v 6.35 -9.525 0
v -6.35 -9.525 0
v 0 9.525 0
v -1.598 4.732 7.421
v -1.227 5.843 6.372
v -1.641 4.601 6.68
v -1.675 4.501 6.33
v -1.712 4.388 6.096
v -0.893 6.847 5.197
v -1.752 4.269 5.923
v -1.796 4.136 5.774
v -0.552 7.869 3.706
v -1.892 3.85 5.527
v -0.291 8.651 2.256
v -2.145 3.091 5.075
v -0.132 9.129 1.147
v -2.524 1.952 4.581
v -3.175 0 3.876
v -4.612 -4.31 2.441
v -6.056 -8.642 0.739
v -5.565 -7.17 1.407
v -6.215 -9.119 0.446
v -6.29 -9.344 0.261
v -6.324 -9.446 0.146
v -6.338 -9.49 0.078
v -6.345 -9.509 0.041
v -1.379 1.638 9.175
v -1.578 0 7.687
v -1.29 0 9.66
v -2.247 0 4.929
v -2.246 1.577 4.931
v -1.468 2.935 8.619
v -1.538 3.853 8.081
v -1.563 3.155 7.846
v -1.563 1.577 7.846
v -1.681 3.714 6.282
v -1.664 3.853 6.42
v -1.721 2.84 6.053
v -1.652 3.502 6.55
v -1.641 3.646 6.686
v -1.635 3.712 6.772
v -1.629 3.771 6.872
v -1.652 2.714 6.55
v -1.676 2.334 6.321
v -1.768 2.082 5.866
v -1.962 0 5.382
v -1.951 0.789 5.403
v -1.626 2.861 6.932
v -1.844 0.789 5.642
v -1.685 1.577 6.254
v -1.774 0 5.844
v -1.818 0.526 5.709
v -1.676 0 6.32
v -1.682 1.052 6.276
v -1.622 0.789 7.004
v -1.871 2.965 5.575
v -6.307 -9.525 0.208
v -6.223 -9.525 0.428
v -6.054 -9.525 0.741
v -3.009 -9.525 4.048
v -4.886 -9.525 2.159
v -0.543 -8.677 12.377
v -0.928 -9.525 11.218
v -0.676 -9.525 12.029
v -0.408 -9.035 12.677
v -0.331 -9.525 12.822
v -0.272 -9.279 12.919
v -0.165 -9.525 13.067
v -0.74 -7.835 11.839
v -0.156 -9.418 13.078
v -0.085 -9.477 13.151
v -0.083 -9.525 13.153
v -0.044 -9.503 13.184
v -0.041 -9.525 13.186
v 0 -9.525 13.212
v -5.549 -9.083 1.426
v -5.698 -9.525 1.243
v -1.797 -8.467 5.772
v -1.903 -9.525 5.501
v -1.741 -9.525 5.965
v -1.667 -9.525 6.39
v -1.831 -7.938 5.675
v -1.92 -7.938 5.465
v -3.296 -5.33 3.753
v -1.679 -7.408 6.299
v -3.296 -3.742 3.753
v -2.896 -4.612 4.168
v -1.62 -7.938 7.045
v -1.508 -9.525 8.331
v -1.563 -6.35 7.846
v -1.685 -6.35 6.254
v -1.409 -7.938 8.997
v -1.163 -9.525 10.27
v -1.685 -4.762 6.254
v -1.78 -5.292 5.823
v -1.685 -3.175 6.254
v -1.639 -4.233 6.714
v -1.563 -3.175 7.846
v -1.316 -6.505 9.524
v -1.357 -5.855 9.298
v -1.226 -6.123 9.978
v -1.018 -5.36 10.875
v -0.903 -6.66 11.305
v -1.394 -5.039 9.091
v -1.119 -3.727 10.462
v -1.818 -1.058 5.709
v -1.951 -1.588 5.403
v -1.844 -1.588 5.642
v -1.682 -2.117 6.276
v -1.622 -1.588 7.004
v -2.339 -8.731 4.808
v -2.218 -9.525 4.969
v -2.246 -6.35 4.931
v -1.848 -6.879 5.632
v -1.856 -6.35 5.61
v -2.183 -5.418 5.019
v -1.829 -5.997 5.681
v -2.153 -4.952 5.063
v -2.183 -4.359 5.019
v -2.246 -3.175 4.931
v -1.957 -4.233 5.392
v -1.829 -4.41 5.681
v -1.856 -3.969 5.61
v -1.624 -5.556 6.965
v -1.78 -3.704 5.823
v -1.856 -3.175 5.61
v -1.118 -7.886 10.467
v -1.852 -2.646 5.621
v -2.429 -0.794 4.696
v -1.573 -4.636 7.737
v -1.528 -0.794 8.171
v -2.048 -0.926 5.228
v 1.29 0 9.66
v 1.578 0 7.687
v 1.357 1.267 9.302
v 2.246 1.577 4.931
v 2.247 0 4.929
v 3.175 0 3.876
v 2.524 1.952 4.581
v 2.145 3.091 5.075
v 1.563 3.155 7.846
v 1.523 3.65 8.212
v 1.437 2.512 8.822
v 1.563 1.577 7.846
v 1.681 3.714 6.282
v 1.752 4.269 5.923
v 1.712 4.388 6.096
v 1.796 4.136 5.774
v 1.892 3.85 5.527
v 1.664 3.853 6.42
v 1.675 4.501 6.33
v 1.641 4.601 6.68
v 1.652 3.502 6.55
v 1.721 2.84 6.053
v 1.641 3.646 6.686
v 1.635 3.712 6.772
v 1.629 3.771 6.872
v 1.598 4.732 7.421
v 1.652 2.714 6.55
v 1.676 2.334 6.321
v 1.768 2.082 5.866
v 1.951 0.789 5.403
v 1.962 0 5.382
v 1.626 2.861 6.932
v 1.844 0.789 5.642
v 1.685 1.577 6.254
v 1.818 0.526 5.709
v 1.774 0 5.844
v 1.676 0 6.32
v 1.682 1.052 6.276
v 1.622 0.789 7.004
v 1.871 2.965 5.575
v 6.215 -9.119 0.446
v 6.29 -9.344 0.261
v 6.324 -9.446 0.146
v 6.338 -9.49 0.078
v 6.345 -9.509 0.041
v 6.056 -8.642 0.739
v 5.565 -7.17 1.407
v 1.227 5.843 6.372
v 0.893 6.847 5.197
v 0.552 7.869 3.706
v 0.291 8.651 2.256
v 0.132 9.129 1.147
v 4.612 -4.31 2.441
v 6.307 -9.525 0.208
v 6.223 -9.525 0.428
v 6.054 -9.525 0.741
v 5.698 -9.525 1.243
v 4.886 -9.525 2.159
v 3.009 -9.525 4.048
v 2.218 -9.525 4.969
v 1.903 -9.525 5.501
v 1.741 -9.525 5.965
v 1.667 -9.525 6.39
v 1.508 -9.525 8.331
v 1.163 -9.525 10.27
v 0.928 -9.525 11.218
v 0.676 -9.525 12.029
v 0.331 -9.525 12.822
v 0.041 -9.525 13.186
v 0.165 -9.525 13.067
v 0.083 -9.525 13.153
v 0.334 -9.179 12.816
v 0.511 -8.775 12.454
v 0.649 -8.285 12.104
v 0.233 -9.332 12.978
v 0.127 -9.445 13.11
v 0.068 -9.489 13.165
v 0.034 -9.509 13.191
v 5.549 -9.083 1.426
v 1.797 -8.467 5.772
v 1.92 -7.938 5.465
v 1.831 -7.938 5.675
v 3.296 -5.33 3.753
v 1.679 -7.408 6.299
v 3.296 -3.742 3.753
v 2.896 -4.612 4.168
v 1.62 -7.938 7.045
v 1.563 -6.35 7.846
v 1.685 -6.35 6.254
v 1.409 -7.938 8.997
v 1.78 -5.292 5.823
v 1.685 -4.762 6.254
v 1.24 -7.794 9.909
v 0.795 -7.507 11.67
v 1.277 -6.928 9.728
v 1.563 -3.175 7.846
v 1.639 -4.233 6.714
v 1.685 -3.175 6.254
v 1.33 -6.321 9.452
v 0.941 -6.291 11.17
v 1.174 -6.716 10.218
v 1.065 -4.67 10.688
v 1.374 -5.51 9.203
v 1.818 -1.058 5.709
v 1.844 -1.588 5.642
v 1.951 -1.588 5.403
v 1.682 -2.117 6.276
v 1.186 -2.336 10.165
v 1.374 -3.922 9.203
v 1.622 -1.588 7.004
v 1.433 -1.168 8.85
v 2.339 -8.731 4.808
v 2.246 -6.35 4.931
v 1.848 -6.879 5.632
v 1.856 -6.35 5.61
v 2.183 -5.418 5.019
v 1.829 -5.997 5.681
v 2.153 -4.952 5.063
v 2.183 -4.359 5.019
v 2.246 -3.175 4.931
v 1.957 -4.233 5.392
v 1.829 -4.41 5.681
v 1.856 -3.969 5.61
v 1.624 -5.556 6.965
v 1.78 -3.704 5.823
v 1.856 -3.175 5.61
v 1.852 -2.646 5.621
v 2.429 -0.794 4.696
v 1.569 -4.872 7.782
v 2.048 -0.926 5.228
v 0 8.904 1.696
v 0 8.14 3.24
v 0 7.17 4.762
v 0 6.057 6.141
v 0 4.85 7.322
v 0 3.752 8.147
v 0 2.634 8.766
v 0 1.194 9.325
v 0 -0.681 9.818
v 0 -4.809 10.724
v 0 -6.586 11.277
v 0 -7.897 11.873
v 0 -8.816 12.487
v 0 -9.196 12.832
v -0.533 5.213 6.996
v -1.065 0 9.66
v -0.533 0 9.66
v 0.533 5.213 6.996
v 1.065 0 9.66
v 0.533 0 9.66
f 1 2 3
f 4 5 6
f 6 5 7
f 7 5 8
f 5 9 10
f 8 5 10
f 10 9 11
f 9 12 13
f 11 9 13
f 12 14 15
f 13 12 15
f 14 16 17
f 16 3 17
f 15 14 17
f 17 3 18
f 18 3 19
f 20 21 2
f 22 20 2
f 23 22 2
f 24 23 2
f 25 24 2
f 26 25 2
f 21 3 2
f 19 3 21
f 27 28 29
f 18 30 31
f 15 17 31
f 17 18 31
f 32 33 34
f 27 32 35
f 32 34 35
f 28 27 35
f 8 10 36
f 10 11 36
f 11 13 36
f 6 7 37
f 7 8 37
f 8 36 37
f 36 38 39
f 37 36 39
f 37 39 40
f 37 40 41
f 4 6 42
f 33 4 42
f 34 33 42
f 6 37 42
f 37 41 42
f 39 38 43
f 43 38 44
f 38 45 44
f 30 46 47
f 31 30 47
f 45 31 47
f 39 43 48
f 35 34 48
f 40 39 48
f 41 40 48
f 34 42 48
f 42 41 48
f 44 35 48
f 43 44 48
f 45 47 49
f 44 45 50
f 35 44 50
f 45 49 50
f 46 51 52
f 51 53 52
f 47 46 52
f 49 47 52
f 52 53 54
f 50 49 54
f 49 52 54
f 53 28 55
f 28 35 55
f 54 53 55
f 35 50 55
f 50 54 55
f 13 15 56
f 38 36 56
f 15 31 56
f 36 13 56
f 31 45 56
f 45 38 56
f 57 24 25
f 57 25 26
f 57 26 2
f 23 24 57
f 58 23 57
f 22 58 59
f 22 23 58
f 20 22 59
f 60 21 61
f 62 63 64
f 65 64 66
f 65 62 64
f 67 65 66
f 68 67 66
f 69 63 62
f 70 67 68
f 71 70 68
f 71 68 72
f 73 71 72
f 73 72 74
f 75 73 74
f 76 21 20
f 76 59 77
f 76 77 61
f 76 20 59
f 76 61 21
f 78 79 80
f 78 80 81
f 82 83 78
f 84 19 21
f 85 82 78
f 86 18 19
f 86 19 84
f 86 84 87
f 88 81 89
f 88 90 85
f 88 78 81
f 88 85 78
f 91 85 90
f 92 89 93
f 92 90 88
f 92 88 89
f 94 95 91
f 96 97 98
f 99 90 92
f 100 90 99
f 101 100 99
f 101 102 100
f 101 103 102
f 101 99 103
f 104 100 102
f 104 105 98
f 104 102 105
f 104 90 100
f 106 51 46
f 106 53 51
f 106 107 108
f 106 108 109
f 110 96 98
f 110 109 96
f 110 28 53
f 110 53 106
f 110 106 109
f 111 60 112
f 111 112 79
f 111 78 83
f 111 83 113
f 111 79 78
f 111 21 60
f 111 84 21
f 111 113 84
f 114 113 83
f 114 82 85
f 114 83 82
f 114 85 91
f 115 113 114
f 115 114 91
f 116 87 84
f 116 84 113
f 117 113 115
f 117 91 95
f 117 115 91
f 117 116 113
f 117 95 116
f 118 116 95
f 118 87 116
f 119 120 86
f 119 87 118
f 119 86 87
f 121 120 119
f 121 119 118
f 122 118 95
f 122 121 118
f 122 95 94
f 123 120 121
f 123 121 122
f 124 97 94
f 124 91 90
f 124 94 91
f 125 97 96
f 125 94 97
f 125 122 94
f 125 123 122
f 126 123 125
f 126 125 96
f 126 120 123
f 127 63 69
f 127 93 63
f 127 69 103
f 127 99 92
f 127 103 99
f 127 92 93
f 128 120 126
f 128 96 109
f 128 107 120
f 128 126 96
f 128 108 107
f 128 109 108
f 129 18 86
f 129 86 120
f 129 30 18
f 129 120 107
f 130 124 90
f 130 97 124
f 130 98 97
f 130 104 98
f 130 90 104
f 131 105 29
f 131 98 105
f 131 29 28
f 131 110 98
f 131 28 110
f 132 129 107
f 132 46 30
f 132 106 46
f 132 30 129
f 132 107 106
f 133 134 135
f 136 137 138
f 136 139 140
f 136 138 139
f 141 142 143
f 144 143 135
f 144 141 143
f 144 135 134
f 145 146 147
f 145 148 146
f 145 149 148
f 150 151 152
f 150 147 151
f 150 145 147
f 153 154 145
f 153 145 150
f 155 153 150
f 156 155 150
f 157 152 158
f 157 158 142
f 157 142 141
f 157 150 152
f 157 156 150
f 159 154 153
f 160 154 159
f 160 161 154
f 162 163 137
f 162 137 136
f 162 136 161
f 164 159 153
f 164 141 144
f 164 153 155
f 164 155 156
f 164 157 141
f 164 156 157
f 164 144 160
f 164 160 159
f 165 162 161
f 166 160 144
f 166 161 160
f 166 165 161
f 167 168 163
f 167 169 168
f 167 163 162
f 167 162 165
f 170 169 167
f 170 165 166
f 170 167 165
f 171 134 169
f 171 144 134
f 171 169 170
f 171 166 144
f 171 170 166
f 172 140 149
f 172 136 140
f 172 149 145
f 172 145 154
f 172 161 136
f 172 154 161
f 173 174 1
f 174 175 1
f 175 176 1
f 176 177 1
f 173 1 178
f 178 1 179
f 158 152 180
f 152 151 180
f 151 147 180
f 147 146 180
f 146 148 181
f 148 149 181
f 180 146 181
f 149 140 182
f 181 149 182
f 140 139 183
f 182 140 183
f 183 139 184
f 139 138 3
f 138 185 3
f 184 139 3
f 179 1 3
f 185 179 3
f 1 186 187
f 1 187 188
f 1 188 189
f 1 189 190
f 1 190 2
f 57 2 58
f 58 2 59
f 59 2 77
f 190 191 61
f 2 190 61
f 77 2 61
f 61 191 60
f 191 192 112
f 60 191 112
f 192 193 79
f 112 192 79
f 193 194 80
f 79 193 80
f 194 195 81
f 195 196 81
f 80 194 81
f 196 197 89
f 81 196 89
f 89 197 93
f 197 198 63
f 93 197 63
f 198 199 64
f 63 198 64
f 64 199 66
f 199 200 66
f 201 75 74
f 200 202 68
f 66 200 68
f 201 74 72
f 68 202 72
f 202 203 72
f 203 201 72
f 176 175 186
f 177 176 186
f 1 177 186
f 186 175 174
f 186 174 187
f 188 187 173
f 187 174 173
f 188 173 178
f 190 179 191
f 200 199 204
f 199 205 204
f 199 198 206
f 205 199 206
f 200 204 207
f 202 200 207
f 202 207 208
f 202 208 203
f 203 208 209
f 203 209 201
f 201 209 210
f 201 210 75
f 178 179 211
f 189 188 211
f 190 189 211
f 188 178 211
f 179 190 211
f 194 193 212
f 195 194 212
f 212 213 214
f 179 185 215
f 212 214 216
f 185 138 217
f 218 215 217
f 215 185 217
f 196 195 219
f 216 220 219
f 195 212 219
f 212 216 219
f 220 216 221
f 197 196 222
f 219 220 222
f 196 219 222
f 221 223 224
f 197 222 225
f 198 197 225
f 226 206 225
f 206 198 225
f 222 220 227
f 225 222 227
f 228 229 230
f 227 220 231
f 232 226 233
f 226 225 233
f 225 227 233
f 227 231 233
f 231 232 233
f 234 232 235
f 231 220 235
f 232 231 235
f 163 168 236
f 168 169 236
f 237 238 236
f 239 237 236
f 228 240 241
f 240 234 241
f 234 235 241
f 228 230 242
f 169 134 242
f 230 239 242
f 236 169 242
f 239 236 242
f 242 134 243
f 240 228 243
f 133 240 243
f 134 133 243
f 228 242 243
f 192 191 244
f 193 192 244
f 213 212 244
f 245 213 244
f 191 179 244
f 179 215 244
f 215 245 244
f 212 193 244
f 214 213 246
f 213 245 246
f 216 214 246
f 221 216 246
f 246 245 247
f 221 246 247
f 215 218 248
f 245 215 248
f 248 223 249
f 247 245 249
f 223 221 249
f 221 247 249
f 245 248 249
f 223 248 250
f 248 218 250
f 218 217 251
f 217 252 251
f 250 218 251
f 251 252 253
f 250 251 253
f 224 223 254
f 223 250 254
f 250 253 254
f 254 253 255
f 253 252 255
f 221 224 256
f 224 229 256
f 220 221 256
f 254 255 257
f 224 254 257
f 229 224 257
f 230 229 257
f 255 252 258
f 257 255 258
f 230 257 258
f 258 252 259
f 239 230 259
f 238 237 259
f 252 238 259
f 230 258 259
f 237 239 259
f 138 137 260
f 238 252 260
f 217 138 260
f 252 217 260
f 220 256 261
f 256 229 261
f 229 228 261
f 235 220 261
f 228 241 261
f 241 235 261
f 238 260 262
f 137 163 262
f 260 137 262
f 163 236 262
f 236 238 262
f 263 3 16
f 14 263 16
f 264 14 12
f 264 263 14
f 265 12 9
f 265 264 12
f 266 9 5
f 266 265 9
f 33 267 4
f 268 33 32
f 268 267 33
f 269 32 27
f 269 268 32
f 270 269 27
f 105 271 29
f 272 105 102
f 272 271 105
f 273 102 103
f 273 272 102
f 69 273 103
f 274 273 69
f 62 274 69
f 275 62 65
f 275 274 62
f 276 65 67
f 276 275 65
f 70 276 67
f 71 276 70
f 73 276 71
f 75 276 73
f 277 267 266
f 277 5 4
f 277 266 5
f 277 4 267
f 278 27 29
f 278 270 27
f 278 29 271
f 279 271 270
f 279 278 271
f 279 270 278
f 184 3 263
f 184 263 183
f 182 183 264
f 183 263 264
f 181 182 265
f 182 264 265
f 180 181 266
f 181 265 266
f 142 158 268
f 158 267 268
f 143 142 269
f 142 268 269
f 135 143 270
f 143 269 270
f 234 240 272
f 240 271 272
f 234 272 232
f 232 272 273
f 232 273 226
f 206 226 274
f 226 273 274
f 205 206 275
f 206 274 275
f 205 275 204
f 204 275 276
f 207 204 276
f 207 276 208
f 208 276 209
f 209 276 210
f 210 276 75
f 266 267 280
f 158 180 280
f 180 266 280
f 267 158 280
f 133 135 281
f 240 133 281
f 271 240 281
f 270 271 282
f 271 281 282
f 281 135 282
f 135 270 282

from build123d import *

# Parameters (mm, degrees)
F2_DEPTH      = 9.525
F2_DEPTH_BACK = 9.525
F4_DEPTH      = 25.4
F4_DEPTH_BACK = 25.4
F6_DEPTH      = 25.4


with BuildPart() as f2:
    # F1 (on Front) → F2 (new body, two sides)
    with BuildSketch(Plane.XZ) as f2_sk:
        with BuildLine():
            add(Edge.make_bspline(
                [(-6.35, 0), (-6.2110349142, 1.2906979649), (-1.2972179352, 5.0159845421), (-1.9115572012, 7.3429921483), (-0.6704563662, 12.8414753028), (0, 13.2119530768)],
                knots=[0, 0, 0, 0, 0.3821787562, 0.6432599793, 1, 1, 1, 1], degree=3))
            Line((-6.35, 0), (6.35, 0))
            add(Edge.make_bspline(
                [(6.35, 0), (6.2110349142, 1.2906979649), (1.2972179352, 5.0159845421), (1.9115572012, 7.3429921483), (0.6704563662, 12.8414753028), (0, 13.2119530768)],
                knots=[0, 0, 0, 0, 0.3821787562, 0.6432599793, 1, 1, 1, 1], degree=3))
        make_face()
    extrude(amount=F2_DEPTH)
    extrude(f2_sk.sketch, amount=-F2_DEPTH_BACK)

    # F3 (on Right) → F4 (cut, two sides)
    with BuildSketch(Plane.YZ) as f4_sk:
        with BuildLine():
            add(Edge.make_bspline(
                [(9.525, 0), (8.6071506136, 3.0190129192), (5.4813965302, 7.4387582474), (0.4496493374, 10.0745490682), (-7.747826098, 10.8756744565), (-9.525, 13.2119530768)],
                knots=[0, 0, 0, 0, 0.3382746758, 0.6237759463, 1, 1, 1, 1], degree=3))
            add(Edge.make_bspline(
                [(9.525, 0), (9.525, 0.430232655), (9.525, 2.1022275023), (9.525, 4.5498915517), (9.525, 8.4001506644), (9.525, 11.132140176), (9.525, 13.0884604855), (9.525, 13.2119530768)],
                knots=[0, 0, 0, 0, 1.2906979649, 5.0159845421, 7.3429921483, 12.8414753028, 13.2119530768, 13.2119530768, 13.2119530768, 13.2119530768], degree=3))
            Line((9.525, 13.2119530768), (-9.525, 13.2119530768))
        make_face()
    extrude(amount=F4_DEPTH, mode=Mode.SUBTRACT)
    extrude(f4_sk.sketch, amount=-F4_DEPTH_BACK, mode=Mode.SUBTRACT)

    # F5 (on Top) → F6 (intersect)
    with BuildSketch(Plane.XY):
        Polygon((0, 9.525), (-6.35, -9.525), (6.35, -9.525), align=None)
    extrude(amount=F6_DEPTH, mode=Mode.INTERSECT)


solid = f2.part
